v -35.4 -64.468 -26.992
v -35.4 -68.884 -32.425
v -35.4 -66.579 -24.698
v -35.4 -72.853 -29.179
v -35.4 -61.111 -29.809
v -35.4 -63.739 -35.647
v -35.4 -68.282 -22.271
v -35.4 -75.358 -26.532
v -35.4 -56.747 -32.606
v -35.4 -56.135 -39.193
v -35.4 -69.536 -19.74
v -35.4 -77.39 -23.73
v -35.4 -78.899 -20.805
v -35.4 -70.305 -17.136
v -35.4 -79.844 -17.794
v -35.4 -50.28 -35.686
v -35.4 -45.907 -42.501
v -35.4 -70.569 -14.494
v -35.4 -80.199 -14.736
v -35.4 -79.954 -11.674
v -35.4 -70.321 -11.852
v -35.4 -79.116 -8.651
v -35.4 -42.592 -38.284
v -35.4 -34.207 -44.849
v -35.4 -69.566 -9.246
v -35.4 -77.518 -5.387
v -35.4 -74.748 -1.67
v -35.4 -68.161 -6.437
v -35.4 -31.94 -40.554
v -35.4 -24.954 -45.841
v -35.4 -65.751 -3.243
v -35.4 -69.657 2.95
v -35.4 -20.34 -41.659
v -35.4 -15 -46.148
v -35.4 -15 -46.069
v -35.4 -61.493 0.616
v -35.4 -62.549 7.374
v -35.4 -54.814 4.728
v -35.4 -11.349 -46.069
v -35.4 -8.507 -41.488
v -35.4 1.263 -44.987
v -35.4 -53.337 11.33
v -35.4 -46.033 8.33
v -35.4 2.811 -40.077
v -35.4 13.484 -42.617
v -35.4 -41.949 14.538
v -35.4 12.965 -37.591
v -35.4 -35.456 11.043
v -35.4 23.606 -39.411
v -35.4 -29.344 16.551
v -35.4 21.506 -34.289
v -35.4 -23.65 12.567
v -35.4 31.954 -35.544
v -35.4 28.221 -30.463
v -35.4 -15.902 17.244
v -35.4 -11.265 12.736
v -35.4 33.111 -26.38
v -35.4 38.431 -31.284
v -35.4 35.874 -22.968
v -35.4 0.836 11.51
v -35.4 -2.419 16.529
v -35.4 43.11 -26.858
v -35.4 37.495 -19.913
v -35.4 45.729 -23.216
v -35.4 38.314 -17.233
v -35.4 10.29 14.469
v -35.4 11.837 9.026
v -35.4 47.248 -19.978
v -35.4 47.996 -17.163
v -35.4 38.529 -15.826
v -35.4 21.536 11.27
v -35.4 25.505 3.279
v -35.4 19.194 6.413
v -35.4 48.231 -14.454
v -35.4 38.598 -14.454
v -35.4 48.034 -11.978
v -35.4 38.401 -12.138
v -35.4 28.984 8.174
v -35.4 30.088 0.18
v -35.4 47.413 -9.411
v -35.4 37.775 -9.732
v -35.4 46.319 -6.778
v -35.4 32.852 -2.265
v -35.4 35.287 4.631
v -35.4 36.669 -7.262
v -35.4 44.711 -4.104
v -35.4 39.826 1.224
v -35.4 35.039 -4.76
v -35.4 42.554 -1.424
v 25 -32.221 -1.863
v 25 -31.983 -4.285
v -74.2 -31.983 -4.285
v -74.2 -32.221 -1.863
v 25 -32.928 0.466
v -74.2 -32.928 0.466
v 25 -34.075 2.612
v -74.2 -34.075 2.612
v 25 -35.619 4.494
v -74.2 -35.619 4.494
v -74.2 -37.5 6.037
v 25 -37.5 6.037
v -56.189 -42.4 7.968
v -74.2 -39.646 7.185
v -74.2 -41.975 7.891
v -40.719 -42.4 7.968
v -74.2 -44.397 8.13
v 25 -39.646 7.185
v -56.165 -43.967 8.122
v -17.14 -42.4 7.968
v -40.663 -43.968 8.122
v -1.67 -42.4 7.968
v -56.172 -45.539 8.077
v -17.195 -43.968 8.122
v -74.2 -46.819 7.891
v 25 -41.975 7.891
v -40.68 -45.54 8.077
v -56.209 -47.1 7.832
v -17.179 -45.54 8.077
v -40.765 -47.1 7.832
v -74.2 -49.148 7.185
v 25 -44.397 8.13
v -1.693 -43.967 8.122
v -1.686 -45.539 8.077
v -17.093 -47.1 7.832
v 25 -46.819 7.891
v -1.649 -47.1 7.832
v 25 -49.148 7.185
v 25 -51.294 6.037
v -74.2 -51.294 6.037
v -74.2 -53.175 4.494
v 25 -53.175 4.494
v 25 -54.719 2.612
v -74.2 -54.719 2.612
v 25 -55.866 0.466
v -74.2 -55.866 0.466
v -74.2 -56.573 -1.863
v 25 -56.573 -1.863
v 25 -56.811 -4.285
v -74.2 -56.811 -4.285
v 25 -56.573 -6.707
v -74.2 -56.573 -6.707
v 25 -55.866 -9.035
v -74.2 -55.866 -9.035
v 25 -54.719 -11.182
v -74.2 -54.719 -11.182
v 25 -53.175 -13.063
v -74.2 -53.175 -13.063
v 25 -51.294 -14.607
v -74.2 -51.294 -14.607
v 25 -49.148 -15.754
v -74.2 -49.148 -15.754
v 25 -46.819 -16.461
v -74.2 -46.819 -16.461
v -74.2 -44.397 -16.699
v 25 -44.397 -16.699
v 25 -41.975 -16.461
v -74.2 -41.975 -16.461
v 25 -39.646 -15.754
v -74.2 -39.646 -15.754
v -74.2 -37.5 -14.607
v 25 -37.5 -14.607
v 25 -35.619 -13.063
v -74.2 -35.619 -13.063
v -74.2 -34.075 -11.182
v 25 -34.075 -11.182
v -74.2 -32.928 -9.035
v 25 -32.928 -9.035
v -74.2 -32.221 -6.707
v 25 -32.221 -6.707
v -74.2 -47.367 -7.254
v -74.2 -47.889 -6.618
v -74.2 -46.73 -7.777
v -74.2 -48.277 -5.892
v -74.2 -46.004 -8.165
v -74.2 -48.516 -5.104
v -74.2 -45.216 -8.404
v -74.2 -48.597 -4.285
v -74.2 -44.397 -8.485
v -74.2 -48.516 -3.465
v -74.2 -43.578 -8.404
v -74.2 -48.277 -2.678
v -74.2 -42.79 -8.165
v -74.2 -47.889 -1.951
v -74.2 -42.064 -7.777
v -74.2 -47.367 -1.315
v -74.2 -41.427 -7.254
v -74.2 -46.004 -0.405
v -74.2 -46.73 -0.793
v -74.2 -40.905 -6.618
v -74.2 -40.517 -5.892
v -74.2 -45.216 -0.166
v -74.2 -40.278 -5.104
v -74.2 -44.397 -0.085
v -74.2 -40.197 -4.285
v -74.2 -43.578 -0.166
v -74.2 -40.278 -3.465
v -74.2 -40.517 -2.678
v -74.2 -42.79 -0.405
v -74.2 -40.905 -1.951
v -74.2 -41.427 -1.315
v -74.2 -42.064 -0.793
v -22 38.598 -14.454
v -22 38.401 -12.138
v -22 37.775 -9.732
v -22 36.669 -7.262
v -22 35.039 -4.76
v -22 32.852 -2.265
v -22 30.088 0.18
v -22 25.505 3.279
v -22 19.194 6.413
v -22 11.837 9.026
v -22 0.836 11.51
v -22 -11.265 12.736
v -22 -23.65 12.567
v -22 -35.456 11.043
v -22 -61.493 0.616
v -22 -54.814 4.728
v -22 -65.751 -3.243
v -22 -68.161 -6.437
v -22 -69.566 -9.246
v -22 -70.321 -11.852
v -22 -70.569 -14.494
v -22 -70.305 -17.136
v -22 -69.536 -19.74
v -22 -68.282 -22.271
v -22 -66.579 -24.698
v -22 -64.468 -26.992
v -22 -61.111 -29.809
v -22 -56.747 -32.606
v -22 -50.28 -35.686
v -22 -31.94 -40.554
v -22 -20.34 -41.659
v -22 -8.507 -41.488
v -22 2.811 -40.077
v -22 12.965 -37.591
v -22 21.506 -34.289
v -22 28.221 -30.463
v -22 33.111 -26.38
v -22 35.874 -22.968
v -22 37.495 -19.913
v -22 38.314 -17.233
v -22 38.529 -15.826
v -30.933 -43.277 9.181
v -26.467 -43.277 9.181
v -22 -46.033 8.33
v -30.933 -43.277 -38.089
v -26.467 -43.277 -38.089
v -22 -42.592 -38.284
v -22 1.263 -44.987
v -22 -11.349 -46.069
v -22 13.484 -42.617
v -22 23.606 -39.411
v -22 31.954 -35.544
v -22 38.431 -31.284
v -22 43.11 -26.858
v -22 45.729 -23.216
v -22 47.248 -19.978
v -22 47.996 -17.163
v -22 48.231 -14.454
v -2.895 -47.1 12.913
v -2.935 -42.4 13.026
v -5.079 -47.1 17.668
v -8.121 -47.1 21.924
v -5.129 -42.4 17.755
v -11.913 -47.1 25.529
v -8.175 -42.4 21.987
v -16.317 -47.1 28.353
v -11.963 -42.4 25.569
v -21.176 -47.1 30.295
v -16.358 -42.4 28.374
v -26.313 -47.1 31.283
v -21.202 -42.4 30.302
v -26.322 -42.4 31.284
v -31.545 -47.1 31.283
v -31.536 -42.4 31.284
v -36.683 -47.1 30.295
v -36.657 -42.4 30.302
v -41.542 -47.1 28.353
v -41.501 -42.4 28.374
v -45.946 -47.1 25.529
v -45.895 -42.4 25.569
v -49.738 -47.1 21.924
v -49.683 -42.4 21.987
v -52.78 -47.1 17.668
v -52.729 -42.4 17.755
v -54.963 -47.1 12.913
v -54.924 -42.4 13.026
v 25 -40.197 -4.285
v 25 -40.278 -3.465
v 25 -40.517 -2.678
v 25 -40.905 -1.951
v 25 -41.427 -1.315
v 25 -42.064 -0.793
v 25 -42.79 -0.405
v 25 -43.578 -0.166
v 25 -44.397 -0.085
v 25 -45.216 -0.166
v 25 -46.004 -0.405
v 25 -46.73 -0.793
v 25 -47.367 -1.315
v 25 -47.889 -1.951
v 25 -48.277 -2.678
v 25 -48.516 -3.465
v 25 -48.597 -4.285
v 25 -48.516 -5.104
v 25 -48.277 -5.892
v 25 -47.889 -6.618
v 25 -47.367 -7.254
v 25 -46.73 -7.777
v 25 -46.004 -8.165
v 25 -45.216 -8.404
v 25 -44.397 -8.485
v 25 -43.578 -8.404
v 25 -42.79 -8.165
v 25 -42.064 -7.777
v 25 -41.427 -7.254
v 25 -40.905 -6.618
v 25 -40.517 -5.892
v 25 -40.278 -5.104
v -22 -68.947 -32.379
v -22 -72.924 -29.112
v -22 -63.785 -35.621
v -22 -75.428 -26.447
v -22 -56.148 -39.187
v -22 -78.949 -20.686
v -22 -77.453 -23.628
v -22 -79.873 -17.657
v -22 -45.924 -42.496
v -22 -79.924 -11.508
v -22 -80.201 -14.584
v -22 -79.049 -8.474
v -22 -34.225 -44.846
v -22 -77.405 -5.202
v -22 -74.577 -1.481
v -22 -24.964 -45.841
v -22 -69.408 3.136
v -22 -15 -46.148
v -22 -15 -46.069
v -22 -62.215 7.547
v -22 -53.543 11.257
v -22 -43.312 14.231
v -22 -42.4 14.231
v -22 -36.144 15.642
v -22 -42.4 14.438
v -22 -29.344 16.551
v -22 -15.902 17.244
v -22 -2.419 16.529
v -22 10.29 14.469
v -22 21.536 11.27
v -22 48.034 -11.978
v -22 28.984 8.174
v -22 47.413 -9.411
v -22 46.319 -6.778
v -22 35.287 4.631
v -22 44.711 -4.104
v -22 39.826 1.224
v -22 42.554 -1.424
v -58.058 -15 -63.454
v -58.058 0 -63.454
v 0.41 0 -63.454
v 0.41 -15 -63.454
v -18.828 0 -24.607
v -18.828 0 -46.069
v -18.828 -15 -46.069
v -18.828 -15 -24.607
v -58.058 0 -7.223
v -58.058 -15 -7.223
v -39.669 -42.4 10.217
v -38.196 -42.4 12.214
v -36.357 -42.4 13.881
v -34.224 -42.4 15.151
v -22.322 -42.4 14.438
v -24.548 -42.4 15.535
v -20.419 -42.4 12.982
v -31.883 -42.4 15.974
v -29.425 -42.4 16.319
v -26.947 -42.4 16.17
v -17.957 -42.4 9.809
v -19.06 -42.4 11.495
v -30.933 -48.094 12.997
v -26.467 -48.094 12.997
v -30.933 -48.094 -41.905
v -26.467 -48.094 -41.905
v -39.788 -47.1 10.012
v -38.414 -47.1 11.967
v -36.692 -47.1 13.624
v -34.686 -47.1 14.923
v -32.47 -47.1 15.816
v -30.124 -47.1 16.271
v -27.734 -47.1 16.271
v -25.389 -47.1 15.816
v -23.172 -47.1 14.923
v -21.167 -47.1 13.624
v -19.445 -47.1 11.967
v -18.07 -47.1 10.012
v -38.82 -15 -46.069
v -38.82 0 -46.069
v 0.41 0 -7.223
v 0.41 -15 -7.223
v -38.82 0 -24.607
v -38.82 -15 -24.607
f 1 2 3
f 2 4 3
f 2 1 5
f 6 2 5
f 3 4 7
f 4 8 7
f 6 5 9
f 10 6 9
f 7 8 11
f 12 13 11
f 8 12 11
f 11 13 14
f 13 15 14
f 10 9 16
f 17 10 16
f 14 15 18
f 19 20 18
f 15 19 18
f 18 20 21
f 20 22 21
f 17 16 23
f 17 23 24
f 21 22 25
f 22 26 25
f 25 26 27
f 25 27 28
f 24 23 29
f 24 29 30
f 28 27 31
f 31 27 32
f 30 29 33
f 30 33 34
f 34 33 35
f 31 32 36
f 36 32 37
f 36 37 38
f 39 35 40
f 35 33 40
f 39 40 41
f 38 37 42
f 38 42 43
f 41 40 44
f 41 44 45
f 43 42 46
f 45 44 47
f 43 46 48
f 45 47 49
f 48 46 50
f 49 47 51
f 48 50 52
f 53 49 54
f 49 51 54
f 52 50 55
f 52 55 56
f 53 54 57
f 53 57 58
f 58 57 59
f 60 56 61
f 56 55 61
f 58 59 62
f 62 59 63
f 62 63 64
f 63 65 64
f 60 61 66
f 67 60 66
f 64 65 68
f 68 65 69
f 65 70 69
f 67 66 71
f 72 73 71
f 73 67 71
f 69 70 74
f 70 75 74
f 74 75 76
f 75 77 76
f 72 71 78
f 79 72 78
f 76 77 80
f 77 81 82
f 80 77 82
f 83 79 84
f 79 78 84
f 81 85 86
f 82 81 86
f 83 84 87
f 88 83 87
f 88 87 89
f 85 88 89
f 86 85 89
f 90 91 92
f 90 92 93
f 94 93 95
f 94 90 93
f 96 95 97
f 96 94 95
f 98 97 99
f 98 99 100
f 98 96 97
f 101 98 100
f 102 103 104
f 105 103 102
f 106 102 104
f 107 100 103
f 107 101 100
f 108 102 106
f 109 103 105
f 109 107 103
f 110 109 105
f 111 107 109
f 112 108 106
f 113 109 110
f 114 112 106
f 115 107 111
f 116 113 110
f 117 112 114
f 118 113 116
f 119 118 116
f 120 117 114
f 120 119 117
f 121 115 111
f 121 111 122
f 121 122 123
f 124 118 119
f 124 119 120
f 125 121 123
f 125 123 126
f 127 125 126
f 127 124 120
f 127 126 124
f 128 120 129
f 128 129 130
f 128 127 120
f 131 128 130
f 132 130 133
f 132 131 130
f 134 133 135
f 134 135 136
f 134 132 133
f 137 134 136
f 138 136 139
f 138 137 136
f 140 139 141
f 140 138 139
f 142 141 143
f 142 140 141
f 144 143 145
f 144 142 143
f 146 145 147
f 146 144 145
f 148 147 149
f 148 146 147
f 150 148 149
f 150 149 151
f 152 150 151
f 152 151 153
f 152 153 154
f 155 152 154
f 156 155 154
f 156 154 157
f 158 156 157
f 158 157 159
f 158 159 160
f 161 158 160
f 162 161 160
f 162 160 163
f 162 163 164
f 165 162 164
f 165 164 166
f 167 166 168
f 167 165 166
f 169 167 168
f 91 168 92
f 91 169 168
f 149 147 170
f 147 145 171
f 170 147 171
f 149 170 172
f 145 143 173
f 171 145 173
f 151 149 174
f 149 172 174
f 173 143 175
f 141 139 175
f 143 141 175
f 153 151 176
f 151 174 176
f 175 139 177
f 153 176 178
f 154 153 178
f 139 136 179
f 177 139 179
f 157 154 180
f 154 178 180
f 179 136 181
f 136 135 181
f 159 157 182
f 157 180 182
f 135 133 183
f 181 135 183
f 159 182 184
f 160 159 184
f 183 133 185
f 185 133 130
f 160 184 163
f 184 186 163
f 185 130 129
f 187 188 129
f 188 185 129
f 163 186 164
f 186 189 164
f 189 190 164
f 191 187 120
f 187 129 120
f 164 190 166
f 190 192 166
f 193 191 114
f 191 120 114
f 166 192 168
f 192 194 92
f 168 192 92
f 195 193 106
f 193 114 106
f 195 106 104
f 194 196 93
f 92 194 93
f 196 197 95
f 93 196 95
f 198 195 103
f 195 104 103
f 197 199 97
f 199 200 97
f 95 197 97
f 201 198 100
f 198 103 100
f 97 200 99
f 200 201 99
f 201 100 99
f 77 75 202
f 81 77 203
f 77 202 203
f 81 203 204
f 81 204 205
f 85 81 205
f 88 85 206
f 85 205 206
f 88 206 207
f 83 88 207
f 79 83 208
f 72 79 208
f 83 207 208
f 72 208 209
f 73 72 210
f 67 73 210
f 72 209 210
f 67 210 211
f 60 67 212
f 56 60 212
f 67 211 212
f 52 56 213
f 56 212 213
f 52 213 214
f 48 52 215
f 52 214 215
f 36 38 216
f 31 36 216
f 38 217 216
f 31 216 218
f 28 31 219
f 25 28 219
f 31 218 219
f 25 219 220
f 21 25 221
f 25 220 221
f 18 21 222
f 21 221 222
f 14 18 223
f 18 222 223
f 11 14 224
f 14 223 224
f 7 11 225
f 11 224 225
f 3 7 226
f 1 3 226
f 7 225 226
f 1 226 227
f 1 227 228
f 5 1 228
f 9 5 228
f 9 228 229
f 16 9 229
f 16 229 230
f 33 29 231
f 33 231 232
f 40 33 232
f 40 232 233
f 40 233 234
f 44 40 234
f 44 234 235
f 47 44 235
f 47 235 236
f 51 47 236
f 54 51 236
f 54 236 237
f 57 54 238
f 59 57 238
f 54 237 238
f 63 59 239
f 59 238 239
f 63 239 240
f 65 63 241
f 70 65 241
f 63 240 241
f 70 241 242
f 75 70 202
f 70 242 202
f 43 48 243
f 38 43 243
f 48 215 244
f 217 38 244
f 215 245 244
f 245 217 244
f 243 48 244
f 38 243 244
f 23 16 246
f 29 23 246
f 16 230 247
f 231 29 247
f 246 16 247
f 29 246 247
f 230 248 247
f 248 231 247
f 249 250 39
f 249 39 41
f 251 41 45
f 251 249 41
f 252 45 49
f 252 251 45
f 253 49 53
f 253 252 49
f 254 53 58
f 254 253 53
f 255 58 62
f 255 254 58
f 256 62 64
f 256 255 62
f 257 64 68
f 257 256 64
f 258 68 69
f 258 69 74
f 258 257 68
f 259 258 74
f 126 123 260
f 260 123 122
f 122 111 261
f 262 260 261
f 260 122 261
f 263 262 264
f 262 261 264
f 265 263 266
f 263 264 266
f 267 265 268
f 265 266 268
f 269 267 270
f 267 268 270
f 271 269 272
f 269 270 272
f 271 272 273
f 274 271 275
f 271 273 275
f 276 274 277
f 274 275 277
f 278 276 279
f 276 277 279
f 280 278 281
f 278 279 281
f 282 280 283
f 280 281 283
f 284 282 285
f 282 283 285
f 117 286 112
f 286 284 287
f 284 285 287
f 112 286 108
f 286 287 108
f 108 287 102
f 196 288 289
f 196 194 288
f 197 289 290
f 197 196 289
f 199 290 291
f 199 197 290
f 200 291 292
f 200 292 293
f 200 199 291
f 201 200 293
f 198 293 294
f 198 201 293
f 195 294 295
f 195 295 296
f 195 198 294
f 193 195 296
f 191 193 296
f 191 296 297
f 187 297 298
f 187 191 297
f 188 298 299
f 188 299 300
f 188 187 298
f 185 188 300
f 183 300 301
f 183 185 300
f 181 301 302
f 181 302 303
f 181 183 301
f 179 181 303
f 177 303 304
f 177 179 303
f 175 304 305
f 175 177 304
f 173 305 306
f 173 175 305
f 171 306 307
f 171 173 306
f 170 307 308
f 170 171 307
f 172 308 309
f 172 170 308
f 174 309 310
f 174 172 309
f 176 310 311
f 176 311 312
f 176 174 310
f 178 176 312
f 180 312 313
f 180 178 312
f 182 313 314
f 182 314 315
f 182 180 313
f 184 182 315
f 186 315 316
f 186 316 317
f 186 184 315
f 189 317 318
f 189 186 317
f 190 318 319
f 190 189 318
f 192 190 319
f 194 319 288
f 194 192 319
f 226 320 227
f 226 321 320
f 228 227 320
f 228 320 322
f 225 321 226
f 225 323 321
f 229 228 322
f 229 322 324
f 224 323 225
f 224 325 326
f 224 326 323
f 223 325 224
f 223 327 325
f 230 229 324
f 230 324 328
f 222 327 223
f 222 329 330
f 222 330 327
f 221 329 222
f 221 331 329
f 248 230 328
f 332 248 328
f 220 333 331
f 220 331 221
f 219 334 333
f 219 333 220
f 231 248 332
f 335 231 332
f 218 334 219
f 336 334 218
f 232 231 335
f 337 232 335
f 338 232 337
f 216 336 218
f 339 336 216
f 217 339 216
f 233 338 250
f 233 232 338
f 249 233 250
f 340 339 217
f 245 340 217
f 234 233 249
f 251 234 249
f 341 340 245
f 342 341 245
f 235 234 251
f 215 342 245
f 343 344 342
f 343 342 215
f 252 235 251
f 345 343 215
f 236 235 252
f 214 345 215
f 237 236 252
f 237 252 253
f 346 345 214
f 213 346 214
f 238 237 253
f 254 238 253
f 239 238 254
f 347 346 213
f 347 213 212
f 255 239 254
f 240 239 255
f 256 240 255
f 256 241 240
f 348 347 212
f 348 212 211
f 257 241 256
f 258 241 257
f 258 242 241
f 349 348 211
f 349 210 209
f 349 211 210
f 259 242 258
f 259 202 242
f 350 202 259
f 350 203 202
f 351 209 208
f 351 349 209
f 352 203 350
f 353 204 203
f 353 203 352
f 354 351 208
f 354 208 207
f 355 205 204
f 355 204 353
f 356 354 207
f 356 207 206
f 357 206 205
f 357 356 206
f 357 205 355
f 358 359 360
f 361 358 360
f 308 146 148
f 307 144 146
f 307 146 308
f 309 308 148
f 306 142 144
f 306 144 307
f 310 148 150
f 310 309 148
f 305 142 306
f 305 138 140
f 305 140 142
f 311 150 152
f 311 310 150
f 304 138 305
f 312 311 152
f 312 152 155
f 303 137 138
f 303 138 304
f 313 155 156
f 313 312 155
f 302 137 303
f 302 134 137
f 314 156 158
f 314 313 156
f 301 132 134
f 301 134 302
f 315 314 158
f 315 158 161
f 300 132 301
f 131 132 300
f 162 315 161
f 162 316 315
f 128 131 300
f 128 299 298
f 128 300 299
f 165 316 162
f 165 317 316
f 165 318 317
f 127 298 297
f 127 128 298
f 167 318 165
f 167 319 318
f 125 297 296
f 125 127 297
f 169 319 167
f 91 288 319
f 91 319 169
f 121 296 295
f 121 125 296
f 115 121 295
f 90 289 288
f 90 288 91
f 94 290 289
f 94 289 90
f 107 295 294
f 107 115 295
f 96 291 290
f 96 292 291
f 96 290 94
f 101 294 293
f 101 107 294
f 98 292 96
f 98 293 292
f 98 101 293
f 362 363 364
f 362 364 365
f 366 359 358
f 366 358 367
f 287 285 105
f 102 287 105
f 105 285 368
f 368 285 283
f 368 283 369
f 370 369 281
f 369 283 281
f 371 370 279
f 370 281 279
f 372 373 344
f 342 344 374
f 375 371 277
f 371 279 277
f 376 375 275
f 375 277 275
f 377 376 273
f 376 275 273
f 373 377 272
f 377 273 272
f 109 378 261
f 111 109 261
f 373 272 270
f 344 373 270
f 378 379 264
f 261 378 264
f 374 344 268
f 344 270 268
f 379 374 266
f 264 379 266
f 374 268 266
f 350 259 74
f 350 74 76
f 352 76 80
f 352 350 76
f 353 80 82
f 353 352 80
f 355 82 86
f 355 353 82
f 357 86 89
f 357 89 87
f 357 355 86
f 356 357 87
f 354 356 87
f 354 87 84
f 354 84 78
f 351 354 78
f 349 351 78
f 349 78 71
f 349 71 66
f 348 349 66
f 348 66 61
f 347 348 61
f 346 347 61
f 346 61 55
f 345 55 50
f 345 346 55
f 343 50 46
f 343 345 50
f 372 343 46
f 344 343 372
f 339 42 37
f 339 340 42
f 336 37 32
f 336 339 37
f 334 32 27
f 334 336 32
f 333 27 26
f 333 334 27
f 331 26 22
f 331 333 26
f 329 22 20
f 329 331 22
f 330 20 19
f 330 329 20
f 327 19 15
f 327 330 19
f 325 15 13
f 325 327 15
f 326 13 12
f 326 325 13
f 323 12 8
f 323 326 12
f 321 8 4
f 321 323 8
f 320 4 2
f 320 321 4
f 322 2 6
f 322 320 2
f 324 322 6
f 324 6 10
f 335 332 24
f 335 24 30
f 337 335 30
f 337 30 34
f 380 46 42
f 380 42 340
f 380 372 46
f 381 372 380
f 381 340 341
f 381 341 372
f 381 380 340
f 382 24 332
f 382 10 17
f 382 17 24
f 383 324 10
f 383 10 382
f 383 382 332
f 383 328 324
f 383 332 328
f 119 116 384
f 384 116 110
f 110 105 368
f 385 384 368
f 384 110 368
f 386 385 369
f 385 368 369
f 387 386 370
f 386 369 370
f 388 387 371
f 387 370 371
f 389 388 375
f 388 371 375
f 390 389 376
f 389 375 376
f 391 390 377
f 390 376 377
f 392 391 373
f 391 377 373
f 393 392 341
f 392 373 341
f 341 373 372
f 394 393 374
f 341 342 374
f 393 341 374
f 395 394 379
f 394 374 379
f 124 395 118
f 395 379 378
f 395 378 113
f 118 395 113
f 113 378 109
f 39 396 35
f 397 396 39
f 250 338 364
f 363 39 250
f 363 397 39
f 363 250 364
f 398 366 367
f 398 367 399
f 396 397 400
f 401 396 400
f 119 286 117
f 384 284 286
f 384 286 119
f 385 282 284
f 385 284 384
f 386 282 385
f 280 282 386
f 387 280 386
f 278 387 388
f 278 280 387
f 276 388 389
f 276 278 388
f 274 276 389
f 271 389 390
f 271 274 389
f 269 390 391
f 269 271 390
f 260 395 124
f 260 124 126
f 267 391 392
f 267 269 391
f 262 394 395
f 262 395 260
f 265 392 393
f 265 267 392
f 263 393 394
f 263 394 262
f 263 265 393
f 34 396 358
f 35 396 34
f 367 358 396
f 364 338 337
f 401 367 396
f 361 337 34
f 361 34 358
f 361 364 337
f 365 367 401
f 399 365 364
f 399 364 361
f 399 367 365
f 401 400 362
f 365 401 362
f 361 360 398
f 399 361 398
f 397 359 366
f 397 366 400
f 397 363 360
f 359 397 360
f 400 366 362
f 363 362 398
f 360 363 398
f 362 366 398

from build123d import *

# Parameters (mm, degrees)
F0_W          = 58.4684867455
F0_H          = 56.2313273549
F0_W_2        = 19.9926165287
F0_H_2        = 21.461814642
F1_DEPTH      = 15
F3_START      = -22
F3_DEPTH      = 13.4
F2_R          = 12.4144011898
F2_R_2        = 4.1998064772
F4_DEPTH      = 25
F4_DEPTH_BACK = 74.2
F6_START      = 42.4
F6_DEPTH      = 4.7


with BuildPart() as f1:
    # F0 (on Front) → F1 (new body)
    with BuildSketch(Plane.XZ):
        with Locations((-28.8240257651, -35.3383217007)):
            Rectangle(F0_W, F0_H)
        with Locations((-28.8240257651, -35.3383217007)):
            Rectangle(F0_W_2, F0_H_2, mode=Mode.SUBTRACT)
    extrude(amount=F1_DEPTH)

    # F2 (on Right) → F3 (join)
    with BuildSketch(Plane.YZ.offset(F3_START)):
        with BuildLine():
            add(Edge.make_bspline(
                [(48.2305826326, -14.4539853781), (48.2305826326, 40.448520655), (-48.0936503822, 12.9972676384), (-144.4178833971, -14.4539853781), (-48.0936503822, -41.9052383947), (48.2305826326, -69.3564914113), (48.2305826326, -14.4539853781)],
                knots=[0, 0, 0, 2.0943951024, 2.0943951024, 4.1887902048, 4.1887902048, 6.2831853072, 6.2831853072, 6.2831853072], degree=2, weights=[1, 0.5, 1, 0.5, 1, 0.5, 1]))
        make_face()
        with BuildLine():
            add(Edge.make_bspline(
                [(38.5981590781, -14.4539853781), (38.5981590781, 32.8169113411), (-43.277438605, 9.1814629815), (-125.1530362881, -14.4539853781), (-43.277438605, -38.0894337377), (38.5981590781, -61.7248820973), (38.5981590781, -14.4539853781)],
                knots=[0, 0, 0, 2.0943951024, 2.0943951024, 4.1887902048, 4.1887902048, 6.2831853072, 6.2831853072, 6.2831853072], degree=2, weights=[1, 0.5, 1, 0.5, 1, 0.5, 1]))
        make_face(mode=Mode.SUBTRACT)
    extrude(amount=-F3_DEPTH)



with BuildPart() as f4:
    # F2 (on Right) → F4 (new body, two sides)
    with BuildSketch(Plane.YZ) as f4_sk:
        with Locations((-44.3970719813, -4.2847092263)):
            Circle(F2_R)
        with Locations((-44.3970719813, -4.2847092263)):
            Circle(F2_R_2, mode=Mode.SUBTRACT)
    extrude(amount=F4_DEPTH)
    extrude(f4_sk.sketch, amount=-F4_DEPTH_BACK)


with BuildPart() as f1_1:
    add(f1.part)

    add(f4.part)  # F6 merges F4
    # F5 (on Front) → F6 (join)
    with BuildSketch(Plane.XZ.offset(F6_START)):
        with BuildLine():
            ThreePointArc((-40.7975474959, 7.7355672316), (-28.9192202864, 16.3286088343), (-17.054715436, 7.7164926056))
            Line((-17.054715436, 7.7164926056), (-1.6484512016, 7.8265564516))
            ThreePointArc((-1.6484512016, 7.8265564516), (-29.0411817177, 31.4070173638), (-56.2415607274, 7.6049333438))
            Line((-56.2415607274, 7.6049333438), (-40.7975474959, 7.7355672316))
        make_face()
    extrude(amount=F6_DEPTH)


solid = f1_1.part
